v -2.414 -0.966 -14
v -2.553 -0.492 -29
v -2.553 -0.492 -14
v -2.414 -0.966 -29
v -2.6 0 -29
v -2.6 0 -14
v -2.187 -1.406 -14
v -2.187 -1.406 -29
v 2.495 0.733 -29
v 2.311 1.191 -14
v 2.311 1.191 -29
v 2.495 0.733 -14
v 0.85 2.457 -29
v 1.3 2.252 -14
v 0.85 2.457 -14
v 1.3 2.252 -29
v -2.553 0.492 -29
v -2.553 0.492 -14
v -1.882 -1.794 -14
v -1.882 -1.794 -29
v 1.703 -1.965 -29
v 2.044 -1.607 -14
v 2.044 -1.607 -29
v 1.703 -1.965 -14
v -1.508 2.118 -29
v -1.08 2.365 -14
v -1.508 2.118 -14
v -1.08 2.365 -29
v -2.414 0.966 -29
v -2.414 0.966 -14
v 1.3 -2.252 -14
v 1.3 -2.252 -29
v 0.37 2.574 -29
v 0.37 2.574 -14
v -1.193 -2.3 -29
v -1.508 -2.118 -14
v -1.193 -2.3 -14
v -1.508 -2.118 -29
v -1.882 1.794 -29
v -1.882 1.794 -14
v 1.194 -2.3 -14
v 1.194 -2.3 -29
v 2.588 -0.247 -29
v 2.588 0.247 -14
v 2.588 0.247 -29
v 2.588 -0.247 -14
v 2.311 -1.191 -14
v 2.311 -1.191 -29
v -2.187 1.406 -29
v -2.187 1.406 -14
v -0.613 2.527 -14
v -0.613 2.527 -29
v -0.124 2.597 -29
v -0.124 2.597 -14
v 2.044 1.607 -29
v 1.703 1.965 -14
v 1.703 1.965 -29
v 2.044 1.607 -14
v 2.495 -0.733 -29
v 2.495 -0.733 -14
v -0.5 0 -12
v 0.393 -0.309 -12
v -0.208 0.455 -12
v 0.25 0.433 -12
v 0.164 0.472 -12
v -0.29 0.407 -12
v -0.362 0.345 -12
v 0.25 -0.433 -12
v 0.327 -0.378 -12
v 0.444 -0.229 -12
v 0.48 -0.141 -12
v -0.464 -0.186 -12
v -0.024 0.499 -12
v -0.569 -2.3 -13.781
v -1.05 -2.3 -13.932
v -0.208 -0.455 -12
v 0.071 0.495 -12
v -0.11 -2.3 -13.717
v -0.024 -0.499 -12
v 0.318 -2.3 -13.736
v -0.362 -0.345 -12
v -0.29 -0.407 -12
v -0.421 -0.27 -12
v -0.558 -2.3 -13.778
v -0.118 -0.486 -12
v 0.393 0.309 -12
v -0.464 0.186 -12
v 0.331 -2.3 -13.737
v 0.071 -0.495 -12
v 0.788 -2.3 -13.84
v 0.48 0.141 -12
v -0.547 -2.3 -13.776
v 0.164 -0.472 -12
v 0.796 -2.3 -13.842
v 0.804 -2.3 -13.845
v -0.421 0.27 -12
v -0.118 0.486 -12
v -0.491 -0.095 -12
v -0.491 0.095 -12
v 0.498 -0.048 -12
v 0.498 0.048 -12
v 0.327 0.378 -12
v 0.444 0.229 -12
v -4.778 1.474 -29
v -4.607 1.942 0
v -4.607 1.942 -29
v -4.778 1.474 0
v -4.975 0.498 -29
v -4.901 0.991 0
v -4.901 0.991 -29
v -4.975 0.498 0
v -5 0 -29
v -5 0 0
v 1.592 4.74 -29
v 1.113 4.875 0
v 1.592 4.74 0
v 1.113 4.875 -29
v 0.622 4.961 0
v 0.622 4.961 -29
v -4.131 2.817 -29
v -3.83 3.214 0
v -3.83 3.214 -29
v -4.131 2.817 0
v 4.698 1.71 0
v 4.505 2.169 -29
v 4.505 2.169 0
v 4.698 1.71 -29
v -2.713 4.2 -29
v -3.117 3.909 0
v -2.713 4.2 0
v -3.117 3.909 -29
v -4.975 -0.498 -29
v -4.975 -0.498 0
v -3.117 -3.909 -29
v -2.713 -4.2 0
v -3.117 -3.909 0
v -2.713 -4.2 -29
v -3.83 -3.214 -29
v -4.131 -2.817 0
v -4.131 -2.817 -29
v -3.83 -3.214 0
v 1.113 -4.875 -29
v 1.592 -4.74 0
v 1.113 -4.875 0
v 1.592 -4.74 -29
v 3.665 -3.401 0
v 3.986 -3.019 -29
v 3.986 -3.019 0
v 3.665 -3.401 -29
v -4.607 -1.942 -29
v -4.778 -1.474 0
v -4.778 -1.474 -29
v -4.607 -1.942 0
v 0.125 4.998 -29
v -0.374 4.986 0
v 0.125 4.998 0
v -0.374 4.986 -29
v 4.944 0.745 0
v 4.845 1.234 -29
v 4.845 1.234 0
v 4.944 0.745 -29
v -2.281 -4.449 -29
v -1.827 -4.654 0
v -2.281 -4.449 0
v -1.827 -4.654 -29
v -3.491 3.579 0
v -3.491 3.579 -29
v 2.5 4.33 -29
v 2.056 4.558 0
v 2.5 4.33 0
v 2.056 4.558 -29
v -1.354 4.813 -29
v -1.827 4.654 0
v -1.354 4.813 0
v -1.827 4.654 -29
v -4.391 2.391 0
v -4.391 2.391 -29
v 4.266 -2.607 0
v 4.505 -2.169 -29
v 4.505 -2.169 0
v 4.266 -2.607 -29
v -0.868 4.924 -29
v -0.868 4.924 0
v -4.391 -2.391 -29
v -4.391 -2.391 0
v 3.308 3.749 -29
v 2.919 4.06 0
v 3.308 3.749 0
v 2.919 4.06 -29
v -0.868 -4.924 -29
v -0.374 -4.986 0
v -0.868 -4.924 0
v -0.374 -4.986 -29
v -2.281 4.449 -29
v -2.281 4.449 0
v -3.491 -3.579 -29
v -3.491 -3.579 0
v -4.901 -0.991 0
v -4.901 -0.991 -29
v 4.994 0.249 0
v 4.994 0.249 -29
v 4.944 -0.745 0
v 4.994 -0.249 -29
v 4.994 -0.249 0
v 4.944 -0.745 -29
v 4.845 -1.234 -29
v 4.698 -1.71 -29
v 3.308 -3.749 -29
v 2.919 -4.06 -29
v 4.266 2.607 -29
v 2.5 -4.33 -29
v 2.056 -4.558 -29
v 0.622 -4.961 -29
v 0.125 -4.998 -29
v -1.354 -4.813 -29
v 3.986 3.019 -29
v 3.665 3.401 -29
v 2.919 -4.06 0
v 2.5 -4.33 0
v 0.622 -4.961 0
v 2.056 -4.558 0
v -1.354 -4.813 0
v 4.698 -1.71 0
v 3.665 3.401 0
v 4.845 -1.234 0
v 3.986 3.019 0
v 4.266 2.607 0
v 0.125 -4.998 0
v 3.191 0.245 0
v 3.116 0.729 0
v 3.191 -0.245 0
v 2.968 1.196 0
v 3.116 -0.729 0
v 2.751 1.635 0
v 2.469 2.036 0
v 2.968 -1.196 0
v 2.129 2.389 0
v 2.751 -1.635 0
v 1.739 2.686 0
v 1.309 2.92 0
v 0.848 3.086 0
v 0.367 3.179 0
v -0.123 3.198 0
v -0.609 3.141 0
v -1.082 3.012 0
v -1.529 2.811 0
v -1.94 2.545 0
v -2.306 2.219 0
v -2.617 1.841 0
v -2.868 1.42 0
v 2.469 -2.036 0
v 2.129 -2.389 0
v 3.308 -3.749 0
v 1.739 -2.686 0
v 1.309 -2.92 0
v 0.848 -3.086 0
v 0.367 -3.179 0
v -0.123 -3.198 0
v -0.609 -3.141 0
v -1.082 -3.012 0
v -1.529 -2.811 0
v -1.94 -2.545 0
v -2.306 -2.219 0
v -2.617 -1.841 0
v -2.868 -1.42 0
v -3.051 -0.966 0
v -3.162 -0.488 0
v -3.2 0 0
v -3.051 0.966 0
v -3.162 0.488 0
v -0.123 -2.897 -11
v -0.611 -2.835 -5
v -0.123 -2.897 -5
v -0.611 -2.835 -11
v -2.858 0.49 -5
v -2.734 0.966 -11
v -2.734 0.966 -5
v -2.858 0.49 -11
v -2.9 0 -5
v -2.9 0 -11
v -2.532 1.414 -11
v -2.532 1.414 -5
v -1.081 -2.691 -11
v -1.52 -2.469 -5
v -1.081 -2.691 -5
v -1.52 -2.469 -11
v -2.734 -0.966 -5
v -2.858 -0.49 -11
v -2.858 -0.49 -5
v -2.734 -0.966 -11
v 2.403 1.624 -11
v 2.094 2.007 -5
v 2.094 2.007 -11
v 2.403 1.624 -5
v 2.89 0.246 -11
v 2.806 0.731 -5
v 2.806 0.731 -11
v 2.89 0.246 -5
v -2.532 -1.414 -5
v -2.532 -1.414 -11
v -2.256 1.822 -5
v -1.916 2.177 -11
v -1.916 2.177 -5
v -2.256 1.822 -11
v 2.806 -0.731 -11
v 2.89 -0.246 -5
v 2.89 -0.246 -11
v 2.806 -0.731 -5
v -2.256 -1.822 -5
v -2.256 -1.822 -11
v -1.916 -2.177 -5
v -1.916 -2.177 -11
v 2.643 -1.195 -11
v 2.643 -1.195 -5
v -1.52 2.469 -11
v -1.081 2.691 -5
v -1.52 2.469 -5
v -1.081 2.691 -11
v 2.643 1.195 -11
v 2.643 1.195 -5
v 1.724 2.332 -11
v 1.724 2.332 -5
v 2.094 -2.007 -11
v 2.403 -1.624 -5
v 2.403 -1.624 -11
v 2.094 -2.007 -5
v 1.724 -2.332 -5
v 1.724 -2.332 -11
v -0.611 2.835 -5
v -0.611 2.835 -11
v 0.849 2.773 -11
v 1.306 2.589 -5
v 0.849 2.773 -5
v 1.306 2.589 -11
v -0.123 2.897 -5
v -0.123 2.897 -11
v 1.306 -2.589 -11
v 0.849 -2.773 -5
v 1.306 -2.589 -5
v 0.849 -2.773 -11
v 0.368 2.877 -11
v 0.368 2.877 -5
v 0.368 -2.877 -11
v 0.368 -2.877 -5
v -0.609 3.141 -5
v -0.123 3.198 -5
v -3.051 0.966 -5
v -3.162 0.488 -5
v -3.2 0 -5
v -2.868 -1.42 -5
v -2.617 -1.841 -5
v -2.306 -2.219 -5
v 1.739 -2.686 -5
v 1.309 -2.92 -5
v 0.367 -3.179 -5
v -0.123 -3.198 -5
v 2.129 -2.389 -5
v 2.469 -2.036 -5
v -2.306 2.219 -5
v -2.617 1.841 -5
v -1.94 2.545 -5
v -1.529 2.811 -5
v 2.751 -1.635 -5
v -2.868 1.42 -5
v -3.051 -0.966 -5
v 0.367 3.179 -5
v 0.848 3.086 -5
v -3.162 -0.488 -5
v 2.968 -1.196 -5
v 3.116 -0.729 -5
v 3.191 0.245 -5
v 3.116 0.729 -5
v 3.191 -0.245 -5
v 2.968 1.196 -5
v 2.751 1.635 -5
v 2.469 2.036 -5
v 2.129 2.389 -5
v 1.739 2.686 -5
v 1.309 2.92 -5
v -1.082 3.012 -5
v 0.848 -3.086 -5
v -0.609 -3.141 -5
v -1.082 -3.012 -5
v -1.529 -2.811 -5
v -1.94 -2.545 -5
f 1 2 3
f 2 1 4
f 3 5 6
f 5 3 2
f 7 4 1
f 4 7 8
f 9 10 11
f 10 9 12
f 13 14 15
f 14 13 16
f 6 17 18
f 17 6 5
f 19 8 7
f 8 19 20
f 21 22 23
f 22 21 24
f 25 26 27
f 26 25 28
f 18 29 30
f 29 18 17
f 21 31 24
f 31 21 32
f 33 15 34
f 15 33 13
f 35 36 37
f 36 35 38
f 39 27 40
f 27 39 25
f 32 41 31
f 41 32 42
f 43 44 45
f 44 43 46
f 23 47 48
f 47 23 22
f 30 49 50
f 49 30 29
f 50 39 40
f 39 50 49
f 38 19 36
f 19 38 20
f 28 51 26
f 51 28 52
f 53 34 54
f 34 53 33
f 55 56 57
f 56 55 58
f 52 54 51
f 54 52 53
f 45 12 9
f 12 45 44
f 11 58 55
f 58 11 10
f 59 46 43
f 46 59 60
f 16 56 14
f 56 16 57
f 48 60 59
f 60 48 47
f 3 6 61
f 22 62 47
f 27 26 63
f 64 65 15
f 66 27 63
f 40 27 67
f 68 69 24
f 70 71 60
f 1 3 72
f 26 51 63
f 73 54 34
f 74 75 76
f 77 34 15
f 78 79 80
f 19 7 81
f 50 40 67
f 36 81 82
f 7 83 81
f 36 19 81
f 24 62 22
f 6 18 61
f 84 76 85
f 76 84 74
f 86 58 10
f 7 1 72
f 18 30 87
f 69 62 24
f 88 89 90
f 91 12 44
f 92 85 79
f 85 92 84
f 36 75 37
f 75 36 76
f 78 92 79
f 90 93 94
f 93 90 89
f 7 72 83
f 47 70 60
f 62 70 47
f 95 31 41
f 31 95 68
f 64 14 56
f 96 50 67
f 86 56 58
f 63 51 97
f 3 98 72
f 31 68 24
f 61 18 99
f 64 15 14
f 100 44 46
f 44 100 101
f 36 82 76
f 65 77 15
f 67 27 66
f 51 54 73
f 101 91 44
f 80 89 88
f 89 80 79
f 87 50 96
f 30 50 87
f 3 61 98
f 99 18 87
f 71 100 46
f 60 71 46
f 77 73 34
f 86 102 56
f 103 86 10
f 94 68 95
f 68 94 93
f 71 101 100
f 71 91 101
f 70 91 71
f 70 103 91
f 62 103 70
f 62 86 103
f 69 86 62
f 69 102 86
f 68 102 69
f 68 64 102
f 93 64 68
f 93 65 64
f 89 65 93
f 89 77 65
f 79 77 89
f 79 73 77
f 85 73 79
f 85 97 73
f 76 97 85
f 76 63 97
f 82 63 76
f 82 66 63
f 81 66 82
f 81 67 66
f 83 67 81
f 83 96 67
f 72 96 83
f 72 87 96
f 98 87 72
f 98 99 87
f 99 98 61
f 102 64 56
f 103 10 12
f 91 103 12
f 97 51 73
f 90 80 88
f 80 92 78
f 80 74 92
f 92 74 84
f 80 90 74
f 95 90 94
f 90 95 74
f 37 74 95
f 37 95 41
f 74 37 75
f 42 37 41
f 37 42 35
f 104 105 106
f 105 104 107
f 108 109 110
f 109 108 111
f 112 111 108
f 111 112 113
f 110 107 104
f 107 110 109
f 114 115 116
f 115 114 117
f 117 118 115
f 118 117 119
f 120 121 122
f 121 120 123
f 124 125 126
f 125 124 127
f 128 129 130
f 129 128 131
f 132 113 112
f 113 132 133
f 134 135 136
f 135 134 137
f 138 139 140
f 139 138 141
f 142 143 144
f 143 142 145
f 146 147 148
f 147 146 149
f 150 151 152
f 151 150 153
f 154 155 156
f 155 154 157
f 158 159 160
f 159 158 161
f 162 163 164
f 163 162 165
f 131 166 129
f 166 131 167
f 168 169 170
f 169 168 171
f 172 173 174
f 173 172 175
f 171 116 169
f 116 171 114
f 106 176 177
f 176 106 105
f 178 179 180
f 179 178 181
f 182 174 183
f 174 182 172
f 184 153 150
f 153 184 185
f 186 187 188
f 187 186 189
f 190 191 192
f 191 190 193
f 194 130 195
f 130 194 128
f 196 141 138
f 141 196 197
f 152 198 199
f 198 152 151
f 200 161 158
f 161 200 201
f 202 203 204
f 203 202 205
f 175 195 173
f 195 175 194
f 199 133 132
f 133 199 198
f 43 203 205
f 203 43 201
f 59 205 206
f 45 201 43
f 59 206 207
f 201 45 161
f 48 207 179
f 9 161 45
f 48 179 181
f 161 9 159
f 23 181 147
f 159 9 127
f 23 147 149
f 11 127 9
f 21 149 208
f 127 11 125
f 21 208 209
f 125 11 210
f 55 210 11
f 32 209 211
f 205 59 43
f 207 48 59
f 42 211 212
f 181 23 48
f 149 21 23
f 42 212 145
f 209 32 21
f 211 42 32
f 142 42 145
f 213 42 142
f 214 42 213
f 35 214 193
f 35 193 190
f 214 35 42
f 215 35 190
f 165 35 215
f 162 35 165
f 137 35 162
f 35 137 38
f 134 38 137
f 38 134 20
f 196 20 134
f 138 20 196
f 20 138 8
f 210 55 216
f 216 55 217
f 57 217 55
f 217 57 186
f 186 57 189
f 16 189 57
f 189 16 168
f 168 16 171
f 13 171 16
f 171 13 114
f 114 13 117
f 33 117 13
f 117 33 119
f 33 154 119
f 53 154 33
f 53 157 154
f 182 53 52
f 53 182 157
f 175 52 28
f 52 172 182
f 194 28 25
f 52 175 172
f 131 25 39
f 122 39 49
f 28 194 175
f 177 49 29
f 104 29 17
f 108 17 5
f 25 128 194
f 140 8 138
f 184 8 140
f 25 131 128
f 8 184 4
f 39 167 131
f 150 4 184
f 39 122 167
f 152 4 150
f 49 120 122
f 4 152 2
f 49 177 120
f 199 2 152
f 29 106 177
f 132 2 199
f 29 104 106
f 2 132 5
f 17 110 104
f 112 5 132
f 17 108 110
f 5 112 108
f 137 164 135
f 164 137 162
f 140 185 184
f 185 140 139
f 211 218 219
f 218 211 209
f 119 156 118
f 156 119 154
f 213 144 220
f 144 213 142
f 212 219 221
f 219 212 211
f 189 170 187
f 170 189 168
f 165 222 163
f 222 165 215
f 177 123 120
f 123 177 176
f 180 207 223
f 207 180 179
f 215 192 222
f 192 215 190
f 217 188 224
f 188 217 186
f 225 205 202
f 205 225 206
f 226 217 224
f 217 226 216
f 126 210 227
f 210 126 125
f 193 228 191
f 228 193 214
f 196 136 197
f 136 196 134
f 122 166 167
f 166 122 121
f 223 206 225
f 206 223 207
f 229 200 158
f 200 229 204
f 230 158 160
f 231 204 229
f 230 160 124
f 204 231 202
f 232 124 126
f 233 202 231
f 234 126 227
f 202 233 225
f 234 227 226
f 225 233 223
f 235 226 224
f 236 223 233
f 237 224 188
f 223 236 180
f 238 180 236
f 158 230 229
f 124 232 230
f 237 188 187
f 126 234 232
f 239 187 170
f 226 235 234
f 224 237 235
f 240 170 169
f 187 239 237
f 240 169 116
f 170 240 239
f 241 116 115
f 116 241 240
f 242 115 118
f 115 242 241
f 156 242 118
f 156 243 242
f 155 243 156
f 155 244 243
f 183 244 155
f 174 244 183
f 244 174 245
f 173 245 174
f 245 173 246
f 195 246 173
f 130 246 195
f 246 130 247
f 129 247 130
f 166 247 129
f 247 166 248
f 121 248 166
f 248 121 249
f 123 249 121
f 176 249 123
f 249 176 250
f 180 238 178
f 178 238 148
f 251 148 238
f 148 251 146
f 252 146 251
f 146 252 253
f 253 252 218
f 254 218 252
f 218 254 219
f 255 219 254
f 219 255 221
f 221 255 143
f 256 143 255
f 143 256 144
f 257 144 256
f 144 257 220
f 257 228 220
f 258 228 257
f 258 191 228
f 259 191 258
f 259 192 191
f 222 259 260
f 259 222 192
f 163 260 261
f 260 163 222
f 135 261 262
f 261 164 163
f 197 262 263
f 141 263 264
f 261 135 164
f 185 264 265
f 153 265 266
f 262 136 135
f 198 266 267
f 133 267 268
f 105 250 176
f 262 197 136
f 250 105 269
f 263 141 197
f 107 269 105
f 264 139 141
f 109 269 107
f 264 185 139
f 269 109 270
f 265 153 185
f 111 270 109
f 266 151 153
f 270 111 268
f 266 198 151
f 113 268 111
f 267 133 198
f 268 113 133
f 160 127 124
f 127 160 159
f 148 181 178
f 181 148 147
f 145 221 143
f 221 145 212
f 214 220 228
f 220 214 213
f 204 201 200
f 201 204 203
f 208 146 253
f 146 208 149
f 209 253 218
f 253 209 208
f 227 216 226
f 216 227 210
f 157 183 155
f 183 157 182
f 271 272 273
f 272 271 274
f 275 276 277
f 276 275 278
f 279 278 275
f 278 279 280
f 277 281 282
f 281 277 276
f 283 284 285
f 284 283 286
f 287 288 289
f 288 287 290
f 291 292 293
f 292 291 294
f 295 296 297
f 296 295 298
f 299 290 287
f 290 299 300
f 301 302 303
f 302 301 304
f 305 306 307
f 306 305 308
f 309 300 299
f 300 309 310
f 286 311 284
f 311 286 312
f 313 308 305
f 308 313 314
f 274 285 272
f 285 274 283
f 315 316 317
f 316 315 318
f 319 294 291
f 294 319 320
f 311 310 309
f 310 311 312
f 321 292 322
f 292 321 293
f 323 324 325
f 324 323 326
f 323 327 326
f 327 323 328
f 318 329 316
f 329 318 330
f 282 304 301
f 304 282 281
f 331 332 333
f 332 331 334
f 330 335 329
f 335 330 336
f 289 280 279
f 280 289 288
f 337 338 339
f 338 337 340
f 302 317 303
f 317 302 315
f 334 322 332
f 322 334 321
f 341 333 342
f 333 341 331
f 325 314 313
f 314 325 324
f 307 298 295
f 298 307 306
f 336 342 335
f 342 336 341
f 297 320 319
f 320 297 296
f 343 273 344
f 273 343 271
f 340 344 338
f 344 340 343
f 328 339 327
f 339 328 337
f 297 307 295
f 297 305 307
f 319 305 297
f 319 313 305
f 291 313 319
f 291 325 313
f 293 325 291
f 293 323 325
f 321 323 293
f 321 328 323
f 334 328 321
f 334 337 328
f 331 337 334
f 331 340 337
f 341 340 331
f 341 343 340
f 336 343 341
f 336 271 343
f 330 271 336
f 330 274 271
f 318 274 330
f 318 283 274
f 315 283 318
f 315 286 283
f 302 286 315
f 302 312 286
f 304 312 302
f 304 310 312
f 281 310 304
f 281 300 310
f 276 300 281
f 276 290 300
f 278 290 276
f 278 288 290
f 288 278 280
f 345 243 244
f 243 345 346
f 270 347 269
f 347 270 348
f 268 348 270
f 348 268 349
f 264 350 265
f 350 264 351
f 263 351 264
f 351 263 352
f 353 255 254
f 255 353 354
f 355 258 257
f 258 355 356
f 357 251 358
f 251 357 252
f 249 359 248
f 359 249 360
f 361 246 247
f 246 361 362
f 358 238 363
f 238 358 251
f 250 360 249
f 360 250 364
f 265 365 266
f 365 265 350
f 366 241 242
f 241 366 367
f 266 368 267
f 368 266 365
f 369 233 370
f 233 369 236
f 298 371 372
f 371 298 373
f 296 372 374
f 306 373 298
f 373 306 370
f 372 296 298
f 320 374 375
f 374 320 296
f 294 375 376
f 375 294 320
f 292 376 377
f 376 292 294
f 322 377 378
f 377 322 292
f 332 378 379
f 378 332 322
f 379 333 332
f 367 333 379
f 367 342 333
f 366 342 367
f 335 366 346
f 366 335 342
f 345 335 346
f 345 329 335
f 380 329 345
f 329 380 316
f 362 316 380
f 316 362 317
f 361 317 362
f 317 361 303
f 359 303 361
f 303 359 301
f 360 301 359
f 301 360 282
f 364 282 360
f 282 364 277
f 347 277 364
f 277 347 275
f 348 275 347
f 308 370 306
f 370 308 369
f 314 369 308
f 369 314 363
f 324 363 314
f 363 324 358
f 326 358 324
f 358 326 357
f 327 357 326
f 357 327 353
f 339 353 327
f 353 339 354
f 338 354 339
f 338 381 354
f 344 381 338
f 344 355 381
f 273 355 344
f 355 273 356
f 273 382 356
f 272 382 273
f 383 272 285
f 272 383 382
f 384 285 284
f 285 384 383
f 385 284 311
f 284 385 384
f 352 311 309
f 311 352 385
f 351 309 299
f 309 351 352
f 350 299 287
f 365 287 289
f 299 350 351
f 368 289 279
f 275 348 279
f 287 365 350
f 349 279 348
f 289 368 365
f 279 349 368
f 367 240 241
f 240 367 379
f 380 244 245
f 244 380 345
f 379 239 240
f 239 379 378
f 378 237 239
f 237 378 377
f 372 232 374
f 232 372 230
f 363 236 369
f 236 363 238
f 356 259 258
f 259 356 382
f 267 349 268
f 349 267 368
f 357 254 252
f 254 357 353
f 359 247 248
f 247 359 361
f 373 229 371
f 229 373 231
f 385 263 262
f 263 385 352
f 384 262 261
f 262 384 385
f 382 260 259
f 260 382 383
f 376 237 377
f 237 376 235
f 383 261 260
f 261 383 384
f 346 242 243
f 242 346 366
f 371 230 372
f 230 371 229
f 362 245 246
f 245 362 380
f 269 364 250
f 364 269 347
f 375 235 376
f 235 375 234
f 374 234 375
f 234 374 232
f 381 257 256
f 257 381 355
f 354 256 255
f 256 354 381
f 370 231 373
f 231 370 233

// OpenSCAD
$fa=0.5; // default minimum facet angle is now 0.5
$fs=0.5; // default minimum facet size is now 0.5 mm

outside_diameter = 10;
screw_diameter = 5.8;
screw_depth = 11;
screw_outside_diameter = 6.4;
screw_outside_depth = 5;
axis_diameter = 5.2;
axis_notch = 4.5 - 2.5 + 0.3;
axis_height = 15;
total_lenght = screw_depth + axis_height + 3;

rotate([0,180,0])
difference() {
	cylinder(d = outside_diameter, h = total_lenght);
	translate([0,0,-1]) cylinder(d = screw_diameter, h = screw_depth + 1);
	translate([0,0,-1]) cylinder(d = screw_outside_diameter, h = screw_outside_depth + 1);

	translate([0,0,total_lenght+1]) rotate([180,0,0]) difference() {
		union() {
			cylinder(d=axis_diameter, h=axis_height + 1);
			translate([0,0,axis_height+1]) cylinder(d=axis_diameter, d2 = 1, h=2);
		}
		translate([-axis_diameter/2-1,axis_notch,-1]) cube([axis_diameter+2, axis_diameter + 2, axis_height + 3]);
	}
}
